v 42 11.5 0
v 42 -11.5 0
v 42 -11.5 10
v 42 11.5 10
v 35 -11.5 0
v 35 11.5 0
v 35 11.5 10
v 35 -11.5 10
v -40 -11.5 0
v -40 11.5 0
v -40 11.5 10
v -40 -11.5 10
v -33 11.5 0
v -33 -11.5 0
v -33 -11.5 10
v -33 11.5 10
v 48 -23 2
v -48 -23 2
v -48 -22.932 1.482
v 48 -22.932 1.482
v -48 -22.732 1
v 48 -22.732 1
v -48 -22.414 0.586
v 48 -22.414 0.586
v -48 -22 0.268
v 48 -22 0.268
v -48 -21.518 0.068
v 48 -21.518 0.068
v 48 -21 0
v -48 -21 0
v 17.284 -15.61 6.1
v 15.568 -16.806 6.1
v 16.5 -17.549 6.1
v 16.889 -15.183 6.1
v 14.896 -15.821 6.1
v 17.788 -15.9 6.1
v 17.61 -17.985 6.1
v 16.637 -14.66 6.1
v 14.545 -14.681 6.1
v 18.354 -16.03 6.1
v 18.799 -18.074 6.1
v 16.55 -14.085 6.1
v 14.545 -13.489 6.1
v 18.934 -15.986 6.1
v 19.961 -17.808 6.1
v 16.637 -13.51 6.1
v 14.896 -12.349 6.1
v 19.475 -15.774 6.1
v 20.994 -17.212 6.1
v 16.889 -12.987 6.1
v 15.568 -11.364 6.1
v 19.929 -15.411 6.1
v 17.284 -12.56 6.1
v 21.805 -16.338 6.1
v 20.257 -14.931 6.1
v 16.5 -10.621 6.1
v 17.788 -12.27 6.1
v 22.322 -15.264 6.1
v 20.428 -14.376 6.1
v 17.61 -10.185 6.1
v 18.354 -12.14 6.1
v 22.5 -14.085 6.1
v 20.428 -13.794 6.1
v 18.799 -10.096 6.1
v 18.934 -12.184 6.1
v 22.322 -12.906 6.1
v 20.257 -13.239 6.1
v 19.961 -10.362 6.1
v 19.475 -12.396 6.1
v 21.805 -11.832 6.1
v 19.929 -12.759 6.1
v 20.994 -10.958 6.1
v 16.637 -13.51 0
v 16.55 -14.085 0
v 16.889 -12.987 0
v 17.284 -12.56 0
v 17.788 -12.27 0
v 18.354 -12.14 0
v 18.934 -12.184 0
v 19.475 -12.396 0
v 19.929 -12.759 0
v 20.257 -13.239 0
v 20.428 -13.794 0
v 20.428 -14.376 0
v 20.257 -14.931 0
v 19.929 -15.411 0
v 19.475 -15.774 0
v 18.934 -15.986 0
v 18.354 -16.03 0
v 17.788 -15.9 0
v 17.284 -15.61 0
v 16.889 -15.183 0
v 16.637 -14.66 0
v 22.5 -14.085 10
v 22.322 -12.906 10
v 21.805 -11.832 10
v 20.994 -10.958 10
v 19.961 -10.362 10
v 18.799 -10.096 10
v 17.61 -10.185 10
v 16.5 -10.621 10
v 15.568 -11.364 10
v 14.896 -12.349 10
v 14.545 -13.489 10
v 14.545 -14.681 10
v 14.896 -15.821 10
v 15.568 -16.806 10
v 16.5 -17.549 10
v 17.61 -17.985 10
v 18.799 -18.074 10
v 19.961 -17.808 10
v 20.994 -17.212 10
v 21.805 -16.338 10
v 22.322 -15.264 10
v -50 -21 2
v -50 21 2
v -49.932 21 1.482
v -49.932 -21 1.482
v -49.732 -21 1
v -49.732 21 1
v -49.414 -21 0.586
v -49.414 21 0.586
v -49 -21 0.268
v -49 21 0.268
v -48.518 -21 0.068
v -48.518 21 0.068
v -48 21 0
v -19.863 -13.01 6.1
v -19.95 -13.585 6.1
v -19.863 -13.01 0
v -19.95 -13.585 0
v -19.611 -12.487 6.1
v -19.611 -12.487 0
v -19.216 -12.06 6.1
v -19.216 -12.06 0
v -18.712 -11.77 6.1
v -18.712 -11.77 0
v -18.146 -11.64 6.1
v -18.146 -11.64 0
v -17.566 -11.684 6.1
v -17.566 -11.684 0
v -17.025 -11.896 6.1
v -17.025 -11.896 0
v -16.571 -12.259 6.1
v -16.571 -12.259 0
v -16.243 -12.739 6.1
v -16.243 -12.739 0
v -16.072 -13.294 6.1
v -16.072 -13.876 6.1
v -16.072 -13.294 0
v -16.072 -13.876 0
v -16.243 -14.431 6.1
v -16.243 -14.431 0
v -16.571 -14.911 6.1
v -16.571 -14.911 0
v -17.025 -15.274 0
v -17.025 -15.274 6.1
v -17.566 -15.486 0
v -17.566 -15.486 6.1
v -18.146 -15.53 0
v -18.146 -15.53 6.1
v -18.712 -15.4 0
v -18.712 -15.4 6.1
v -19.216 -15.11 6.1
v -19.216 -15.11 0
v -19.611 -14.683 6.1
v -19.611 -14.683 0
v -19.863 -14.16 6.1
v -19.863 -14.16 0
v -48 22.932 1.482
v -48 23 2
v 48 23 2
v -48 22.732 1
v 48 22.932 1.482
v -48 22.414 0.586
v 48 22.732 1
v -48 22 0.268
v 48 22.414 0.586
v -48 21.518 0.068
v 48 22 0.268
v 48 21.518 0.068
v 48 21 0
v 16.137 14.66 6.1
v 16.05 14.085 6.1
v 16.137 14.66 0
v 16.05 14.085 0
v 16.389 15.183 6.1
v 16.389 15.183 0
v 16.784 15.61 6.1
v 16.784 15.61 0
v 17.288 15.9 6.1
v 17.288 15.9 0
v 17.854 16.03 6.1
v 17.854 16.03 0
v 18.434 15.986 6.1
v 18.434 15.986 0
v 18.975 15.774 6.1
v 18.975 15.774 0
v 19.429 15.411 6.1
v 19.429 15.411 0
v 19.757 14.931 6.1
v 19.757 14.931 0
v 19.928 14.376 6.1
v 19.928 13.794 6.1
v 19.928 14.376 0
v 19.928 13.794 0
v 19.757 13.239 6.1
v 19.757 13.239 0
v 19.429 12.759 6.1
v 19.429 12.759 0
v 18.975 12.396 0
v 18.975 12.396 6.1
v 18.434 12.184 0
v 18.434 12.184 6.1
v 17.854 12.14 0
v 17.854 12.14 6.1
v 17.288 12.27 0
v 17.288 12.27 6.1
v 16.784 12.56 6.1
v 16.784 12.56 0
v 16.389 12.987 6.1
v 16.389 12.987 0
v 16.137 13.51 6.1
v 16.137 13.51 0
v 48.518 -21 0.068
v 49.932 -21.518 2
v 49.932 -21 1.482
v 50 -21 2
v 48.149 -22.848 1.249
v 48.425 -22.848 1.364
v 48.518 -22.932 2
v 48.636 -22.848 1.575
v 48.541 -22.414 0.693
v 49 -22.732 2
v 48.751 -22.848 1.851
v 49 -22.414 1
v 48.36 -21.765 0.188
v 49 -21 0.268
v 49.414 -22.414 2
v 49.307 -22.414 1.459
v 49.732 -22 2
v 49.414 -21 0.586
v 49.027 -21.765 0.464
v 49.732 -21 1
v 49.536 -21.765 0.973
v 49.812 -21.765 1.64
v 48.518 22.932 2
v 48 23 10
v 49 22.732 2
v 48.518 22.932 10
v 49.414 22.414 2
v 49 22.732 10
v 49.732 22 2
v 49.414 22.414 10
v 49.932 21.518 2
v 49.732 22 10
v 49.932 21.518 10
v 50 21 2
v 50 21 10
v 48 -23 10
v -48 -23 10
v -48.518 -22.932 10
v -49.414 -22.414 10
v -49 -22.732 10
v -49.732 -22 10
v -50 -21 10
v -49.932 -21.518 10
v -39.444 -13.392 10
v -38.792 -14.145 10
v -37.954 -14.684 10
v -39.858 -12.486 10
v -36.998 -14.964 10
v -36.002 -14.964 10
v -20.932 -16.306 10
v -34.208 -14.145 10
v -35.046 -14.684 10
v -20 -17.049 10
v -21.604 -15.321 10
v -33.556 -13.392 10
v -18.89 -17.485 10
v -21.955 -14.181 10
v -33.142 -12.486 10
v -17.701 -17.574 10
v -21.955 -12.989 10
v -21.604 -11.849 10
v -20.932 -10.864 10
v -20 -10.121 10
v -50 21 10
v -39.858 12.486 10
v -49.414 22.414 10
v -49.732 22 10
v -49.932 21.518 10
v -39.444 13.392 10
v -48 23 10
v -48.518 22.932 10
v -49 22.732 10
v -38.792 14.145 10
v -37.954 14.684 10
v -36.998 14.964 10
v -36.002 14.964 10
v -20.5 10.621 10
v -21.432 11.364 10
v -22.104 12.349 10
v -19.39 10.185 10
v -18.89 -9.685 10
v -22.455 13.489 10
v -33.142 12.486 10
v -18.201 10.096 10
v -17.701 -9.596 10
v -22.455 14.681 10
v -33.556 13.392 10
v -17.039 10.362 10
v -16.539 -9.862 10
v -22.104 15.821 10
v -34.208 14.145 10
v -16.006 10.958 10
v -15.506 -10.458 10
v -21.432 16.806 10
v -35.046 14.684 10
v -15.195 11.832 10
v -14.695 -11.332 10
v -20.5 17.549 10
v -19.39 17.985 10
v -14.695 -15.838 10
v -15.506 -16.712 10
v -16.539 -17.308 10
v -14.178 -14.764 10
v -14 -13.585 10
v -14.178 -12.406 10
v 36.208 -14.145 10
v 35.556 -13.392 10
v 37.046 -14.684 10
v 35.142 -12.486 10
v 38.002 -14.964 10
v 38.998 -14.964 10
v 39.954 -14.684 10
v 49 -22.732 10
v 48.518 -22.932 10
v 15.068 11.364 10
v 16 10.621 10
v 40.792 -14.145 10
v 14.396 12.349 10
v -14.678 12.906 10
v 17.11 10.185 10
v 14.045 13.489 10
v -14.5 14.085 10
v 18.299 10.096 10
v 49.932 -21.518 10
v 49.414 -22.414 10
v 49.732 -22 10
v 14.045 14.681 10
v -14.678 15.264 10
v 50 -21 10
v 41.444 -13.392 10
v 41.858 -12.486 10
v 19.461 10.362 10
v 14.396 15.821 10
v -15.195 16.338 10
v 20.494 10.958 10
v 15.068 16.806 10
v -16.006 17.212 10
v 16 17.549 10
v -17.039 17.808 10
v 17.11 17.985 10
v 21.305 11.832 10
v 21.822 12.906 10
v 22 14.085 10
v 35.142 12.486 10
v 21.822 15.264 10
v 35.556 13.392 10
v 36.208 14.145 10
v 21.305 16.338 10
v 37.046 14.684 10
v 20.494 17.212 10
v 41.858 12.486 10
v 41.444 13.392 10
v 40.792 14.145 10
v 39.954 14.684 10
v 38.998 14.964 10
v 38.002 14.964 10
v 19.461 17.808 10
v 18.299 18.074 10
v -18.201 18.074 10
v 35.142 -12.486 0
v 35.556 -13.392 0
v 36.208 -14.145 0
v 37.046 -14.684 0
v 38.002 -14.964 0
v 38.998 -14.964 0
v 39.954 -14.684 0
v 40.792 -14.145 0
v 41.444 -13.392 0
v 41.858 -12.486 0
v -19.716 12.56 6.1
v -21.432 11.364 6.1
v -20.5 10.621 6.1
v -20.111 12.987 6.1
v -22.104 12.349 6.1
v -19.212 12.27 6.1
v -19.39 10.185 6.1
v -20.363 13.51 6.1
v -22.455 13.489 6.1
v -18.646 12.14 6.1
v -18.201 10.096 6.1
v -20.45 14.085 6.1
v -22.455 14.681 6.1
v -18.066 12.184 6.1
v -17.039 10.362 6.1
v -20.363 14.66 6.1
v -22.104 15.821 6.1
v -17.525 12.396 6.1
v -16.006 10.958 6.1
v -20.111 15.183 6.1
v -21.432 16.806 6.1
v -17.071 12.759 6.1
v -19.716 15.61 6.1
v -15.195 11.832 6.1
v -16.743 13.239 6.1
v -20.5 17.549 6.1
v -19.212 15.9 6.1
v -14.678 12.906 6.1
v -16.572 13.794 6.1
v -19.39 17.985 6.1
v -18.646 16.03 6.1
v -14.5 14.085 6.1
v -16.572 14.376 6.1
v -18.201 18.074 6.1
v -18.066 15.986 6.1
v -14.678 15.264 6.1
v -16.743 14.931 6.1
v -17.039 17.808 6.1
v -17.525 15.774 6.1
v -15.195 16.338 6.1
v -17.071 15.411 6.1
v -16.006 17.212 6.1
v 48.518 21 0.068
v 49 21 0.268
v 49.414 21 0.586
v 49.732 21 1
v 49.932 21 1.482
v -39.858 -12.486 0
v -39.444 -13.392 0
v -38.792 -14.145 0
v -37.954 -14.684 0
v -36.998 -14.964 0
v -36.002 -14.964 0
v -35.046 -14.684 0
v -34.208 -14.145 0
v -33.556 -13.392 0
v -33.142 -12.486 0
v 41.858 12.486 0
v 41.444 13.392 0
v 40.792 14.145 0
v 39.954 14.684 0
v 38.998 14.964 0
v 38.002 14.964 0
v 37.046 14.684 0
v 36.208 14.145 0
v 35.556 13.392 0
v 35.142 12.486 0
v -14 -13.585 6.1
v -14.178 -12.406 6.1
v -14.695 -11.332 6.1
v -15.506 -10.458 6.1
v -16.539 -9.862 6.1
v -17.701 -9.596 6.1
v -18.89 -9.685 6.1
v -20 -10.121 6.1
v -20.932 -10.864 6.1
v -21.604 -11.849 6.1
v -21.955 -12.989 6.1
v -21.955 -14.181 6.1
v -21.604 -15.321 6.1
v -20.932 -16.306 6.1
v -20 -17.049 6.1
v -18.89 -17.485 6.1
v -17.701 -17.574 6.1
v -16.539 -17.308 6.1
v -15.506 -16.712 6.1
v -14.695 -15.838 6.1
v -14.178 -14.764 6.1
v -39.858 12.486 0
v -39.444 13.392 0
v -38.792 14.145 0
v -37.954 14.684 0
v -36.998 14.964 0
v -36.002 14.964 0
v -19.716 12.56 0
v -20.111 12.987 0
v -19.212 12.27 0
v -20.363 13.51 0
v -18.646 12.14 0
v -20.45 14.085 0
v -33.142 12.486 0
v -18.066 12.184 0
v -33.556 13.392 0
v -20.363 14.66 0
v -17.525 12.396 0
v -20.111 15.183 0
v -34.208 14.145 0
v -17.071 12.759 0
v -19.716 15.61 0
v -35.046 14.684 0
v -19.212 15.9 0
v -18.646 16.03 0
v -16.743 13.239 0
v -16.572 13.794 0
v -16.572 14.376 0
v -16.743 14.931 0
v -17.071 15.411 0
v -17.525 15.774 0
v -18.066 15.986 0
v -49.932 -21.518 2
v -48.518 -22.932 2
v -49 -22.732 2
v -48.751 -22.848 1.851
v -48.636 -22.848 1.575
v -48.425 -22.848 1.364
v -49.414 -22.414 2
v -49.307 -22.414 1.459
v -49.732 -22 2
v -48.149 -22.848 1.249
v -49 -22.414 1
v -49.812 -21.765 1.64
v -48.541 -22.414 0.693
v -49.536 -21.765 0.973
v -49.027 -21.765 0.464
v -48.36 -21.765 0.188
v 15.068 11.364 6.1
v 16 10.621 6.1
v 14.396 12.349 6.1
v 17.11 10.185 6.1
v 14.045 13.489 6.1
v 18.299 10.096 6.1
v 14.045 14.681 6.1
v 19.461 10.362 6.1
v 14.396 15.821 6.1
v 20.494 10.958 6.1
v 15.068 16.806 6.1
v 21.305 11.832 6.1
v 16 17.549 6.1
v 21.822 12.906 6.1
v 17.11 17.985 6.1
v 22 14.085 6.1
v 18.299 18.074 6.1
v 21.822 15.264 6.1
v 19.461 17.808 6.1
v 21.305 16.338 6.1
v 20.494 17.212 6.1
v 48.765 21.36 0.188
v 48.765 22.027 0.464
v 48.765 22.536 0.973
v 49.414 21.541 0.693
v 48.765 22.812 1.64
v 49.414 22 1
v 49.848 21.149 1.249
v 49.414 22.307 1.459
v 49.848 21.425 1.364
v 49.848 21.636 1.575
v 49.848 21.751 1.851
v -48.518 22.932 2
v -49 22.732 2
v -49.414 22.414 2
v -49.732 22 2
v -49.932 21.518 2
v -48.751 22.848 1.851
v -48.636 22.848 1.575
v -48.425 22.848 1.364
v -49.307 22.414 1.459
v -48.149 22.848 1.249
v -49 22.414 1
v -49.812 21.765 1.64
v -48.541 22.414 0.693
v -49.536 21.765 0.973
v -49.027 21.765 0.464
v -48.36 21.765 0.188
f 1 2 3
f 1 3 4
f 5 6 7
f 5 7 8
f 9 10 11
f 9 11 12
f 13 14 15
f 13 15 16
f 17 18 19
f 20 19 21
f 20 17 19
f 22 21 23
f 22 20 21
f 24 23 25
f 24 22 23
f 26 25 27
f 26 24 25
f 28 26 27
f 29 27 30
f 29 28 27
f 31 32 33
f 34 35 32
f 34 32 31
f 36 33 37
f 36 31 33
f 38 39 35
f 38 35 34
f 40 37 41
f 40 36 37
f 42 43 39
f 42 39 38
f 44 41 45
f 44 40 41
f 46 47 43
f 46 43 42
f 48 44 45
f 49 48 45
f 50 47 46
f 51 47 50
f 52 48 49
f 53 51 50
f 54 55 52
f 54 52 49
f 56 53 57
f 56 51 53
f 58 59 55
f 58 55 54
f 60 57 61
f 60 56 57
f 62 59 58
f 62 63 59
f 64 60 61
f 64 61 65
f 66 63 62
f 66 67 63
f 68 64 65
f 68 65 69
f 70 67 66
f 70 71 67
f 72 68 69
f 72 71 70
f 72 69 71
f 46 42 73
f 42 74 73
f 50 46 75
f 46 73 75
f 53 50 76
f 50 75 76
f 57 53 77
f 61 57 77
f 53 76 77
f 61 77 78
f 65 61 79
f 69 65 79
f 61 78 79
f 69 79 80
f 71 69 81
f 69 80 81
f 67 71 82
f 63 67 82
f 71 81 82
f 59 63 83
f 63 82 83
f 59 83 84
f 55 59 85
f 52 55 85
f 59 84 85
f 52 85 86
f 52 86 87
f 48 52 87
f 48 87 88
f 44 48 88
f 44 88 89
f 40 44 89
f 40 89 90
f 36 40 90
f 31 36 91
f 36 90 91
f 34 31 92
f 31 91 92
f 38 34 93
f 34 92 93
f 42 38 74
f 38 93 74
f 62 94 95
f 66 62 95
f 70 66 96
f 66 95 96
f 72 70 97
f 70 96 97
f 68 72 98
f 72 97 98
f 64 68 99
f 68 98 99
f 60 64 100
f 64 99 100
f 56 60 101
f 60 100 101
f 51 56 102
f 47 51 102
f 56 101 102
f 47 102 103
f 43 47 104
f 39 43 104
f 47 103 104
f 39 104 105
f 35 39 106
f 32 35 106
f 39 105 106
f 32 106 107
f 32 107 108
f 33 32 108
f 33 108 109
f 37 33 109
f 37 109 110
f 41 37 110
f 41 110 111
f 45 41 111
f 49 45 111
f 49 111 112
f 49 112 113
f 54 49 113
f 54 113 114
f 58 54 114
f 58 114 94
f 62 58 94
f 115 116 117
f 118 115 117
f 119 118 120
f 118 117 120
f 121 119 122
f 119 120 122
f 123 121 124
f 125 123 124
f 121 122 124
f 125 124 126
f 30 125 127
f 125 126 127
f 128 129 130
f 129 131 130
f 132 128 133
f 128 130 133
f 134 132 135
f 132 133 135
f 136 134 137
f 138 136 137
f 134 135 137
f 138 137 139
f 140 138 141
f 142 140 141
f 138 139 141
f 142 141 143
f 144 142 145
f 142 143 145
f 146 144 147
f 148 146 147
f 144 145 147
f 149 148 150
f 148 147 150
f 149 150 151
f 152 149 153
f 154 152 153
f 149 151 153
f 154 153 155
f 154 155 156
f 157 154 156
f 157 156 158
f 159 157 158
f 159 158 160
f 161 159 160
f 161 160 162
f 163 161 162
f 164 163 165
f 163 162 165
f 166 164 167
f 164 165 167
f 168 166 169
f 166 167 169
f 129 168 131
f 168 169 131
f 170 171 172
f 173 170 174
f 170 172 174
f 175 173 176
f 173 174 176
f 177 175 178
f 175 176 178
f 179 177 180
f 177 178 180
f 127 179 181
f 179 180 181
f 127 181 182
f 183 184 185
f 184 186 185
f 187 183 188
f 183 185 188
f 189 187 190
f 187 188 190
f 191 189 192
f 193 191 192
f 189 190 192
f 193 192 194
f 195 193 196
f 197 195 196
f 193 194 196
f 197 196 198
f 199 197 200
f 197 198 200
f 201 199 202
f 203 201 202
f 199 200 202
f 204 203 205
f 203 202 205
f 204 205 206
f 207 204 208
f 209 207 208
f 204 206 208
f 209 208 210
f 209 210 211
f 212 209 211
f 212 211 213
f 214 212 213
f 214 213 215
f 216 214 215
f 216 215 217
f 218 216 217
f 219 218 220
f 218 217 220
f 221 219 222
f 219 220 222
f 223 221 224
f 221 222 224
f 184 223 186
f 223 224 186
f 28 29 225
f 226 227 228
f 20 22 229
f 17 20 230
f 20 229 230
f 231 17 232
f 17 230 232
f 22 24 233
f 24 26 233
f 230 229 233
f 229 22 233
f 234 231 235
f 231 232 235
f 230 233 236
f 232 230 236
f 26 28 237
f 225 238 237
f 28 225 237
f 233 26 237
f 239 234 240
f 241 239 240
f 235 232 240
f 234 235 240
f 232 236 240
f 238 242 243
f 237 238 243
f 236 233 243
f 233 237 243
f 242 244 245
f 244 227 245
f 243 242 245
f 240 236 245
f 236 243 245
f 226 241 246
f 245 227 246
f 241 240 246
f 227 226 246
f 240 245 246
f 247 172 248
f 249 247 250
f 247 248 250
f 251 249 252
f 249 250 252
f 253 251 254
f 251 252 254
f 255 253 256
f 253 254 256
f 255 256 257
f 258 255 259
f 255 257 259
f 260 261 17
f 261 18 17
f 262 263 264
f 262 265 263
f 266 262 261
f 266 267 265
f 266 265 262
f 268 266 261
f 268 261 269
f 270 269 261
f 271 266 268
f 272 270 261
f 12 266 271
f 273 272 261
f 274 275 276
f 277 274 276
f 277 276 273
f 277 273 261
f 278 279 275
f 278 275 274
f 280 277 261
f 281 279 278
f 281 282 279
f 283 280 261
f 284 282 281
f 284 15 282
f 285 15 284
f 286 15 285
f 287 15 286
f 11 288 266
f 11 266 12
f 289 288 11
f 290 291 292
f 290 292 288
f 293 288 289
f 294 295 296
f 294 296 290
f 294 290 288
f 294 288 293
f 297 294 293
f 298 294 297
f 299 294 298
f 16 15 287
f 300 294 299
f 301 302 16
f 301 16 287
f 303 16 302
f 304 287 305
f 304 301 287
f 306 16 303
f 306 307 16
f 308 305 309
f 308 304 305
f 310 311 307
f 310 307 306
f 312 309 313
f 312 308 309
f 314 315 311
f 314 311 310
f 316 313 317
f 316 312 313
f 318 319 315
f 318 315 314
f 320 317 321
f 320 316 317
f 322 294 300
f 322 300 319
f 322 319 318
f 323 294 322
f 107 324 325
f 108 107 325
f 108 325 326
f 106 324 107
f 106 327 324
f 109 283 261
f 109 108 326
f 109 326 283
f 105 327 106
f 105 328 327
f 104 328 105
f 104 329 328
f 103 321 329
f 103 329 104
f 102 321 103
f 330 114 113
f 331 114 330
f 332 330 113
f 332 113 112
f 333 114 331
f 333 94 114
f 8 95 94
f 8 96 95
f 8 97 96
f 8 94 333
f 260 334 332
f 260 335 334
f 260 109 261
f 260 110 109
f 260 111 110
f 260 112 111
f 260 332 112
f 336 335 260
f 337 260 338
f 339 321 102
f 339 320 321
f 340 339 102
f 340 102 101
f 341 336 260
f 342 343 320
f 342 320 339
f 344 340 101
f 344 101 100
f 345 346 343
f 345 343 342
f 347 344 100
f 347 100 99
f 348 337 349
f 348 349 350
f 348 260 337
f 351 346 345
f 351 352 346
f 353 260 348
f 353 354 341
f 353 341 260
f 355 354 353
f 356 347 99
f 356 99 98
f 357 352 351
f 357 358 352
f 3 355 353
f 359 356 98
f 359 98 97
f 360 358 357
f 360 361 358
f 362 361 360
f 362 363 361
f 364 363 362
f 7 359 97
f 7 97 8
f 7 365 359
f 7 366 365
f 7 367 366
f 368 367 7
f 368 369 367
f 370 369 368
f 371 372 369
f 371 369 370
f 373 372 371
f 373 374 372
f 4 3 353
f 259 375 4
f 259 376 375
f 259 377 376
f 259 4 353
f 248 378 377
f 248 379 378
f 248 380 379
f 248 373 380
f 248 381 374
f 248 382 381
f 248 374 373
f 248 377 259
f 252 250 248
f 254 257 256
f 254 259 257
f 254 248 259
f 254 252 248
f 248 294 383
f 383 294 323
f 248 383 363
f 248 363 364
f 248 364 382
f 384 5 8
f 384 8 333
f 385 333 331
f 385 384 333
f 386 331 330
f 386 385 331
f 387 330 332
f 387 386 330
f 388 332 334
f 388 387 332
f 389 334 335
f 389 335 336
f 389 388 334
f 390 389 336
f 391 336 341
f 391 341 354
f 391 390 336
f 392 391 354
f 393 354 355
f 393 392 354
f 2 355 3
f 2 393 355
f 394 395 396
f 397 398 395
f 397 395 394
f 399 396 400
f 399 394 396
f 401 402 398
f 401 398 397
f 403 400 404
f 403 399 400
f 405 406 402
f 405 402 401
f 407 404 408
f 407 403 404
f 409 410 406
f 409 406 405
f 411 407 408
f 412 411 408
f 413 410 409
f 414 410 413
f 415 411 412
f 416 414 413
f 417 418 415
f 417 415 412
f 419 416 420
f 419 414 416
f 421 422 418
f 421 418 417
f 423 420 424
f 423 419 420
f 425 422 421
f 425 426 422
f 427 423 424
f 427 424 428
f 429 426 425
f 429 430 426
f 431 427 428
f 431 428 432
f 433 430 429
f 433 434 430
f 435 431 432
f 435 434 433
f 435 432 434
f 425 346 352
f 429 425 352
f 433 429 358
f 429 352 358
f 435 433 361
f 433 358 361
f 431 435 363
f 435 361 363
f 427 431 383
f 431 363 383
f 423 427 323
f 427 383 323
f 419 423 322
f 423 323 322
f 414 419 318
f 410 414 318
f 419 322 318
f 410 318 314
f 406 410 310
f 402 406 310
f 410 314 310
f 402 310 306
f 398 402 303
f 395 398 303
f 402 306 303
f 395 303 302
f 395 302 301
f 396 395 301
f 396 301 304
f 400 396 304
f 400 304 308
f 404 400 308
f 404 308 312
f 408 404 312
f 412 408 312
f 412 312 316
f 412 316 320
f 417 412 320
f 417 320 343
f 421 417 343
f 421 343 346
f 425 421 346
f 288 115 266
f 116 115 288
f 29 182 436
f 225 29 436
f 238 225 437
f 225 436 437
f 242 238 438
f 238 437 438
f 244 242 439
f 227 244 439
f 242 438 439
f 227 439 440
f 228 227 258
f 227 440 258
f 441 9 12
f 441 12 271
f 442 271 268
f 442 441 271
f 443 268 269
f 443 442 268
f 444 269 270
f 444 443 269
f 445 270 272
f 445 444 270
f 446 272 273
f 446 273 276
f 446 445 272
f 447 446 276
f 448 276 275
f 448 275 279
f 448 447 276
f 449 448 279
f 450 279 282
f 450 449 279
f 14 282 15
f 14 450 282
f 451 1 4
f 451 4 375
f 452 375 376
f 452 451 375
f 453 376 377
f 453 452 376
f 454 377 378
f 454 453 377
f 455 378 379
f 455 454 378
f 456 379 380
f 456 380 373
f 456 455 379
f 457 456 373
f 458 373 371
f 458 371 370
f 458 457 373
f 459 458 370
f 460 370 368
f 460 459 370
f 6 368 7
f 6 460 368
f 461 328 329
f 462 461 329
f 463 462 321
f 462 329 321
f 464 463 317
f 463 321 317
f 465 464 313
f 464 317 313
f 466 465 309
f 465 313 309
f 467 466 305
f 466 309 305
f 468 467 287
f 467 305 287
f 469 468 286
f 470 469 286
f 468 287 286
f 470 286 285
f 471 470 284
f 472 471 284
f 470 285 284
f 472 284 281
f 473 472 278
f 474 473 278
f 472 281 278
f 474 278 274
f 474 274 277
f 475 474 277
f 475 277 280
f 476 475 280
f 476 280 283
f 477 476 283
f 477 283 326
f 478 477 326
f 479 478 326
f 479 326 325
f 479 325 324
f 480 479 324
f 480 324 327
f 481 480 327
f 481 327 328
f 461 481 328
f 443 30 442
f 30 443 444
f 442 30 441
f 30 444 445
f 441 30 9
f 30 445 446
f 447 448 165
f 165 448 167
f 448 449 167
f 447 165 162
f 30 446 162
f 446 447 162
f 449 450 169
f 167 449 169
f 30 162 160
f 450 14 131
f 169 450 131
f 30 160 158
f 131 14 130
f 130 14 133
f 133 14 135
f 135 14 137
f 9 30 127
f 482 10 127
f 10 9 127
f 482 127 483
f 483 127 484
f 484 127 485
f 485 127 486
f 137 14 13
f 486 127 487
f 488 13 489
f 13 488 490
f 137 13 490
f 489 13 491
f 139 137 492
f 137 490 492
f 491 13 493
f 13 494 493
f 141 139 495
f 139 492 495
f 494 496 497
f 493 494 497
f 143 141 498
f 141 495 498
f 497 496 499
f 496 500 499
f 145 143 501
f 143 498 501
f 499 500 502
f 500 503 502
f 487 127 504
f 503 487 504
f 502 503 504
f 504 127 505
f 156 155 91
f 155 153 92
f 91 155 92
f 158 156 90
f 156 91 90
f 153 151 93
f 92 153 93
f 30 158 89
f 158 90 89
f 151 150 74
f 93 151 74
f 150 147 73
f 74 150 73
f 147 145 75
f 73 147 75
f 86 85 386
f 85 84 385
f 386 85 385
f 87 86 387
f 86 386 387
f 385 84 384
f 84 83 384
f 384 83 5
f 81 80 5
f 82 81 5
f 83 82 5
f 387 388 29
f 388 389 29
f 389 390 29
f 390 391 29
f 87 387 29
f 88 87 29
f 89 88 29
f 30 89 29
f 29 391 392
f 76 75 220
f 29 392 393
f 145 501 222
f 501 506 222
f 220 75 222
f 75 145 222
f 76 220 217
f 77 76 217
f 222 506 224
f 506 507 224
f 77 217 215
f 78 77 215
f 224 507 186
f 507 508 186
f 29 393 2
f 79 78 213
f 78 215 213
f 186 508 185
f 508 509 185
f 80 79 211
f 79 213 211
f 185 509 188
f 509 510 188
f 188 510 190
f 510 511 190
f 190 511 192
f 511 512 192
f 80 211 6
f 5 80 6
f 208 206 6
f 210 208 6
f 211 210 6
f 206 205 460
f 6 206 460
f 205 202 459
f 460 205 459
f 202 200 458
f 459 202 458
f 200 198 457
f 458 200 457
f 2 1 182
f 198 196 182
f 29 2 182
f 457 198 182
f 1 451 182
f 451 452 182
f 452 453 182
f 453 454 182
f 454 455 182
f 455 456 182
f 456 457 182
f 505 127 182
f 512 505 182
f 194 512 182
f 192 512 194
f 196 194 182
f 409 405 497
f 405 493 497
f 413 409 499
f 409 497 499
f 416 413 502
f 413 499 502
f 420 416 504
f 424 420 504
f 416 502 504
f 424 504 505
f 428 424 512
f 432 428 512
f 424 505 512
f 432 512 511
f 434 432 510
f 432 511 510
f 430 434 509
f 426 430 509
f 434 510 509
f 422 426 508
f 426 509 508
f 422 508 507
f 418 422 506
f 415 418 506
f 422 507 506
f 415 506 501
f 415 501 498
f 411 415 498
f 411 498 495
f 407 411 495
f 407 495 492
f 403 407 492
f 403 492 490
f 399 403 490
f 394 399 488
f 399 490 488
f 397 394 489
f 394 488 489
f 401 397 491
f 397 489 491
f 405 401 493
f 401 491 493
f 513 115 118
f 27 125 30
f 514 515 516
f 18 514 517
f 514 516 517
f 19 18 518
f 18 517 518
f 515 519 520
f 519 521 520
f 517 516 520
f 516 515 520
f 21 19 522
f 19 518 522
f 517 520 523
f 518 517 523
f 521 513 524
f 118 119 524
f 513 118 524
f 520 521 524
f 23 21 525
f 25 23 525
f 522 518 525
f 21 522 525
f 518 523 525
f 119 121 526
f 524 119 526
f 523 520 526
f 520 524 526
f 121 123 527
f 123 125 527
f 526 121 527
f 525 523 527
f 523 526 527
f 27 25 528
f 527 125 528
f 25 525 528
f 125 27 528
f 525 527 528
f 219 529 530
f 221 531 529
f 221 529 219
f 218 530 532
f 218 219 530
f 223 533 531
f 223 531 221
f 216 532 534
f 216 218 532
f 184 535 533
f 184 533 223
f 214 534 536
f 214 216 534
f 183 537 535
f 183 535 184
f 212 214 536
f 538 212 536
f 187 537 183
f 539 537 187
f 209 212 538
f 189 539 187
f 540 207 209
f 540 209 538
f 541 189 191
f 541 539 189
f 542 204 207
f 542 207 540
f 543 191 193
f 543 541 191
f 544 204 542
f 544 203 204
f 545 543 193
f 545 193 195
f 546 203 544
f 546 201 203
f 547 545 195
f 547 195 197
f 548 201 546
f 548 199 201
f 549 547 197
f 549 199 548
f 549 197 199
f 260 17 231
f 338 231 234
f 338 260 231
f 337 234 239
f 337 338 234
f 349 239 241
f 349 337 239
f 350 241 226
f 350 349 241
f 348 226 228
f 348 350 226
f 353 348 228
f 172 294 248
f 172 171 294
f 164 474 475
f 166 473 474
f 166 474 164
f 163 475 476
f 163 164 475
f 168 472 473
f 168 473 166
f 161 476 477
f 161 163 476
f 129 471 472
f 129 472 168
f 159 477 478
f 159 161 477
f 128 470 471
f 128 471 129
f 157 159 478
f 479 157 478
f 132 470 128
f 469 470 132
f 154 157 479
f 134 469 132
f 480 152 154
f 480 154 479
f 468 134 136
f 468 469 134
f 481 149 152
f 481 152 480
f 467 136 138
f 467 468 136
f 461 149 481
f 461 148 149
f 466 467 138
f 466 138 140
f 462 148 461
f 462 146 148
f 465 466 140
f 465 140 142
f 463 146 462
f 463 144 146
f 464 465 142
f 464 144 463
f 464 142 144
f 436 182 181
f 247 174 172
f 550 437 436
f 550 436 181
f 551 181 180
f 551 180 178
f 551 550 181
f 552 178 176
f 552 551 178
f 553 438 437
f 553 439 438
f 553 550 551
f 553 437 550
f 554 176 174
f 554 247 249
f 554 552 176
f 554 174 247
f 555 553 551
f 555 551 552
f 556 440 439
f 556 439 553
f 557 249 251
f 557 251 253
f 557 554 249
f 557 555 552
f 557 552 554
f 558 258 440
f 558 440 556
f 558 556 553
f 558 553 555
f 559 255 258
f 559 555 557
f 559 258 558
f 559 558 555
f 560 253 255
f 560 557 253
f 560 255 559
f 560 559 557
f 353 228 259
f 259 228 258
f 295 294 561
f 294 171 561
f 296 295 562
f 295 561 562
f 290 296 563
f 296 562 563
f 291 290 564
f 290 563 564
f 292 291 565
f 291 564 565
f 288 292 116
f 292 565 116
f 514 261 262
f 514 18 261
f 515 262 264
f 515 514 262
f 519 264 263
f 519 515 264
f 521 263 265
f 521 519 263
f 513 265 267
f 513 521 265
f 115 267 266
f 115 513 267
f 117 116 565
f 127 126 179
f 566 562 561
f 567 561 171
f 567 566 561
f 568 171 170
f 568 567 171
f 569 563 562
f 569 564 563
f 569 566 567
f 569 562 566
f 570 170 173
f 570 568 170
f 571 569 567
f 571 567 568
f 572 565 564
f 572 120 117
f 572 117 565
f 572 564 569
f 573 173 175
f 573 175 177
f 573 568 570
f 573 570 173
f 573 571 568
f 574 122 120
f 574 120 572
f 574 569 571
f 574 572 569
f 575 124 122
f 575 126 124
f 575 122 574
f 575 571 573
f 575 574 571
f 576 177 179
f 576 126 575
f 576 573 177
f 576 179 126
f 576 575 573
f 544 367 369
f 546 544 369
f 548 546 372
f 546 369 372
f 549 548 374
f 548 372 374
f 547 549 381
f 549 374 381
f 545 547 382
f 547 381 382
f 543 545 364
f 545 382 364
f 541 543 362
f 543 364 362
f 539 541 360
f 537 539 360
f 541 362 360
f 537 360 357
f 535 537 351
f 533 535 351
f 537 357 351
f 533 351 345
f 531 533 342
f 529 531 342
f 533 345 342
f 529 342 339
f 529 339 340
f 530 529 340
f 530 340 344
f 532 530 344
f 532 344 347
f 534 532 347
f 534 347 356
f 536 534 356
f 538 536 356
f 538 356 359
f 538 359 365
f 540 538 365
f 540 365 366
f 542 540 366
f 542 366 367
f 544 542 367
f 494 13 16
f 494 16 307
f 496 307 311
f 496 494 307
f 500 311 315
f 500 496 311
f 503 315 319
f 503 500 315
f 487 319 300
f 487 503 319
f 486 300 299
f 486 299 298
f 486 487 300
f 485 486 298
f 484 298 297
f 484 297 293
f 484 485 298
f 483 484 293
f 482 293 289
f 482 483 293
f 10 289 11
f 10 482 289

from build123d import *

# Parameters (mm, degrees)
SKETCH_W         = 100
SKETCH_H         = 46
PAD_DEPTH        = 10
HOLE_D           = 3.9
HOLE_CBORE_D     = 8
HOLE_CBORE_DEPTH = 3.9
FILLET_R         = 2
FILLET001_R      = 2
FILLET002_R      = 2
FILLET003_R      = 2


with BuildPart() as part:
    # Sketch → Pad (new body)
    with BuildSketch(Plane.XY):
        Rectangle(SKETCH_W, SKETCH_H)
        with BuildLine():
            ThreePointArc((42, 11.5), (38.5, 15), (35, 11.5))
            Line((35, 11.5), (35, -11.5))
            ThreePointArc((35, -11.5), (38.5, -15), (42, -11.5))
            Line((42, -11.5), (42, 11.5))
        make_face(mode=Mode.SUBTRACT)
        with BuildLine():
            ThreePointArc((-33, 11.5), (-36.5, 15), (-40, 11.5))
            Line((-40, 11.5), (-40, -11.5))
            ThreePointArc((-40, -11.5), (-36.5, -15), (-33, -11.5))
            Line((-33, -11.5), (-33, 11.5))
        make_face(mode=Mode.SUBTRACT)
    extrude(amount=PAD_DEPTH)

    # Hole (through all)
    with Locations(Plane.XY.offset(10)):
        with Locations((-18.5, 14.085), (18, 14.085), (-18, -13.585), (18.5, -14.085)):
            CounterBoreHole(HOLE_D / 2, HOLE_CBORE_D / 2, HOLE_CBORE_DEPTH)

    # Fillet
    fillet_edges = [part.edges().sort_by_distance(p)[0] for p in [
        (-50, 0, 0),
    ]]
    fillet(fillet_edges, radius=FILLET_R)

    # Fillet001
    fillet001_edges = [part.edges().sort_by_distance(p)[0] for p in [
        (1, 23, 0),
    ]]
    fillet(fillet001_edges, radius=FILLET001_R)

    # Fillet002
    fillet002_edges = [part.edges().sort_by_distance(p)[0] for p in [
        (50, -1, 0),
    ]]
    fillet(fillet002_edges, radius=FILLET002_R)

    # Fillet003
    fillet003_edges = [part.edges().sort_by_distance(p)[0] for p in [
        (0, -23, 0),
    ]]
    fillet(fillet003_edges, radius=FILLET003_R)


solid = part.part
